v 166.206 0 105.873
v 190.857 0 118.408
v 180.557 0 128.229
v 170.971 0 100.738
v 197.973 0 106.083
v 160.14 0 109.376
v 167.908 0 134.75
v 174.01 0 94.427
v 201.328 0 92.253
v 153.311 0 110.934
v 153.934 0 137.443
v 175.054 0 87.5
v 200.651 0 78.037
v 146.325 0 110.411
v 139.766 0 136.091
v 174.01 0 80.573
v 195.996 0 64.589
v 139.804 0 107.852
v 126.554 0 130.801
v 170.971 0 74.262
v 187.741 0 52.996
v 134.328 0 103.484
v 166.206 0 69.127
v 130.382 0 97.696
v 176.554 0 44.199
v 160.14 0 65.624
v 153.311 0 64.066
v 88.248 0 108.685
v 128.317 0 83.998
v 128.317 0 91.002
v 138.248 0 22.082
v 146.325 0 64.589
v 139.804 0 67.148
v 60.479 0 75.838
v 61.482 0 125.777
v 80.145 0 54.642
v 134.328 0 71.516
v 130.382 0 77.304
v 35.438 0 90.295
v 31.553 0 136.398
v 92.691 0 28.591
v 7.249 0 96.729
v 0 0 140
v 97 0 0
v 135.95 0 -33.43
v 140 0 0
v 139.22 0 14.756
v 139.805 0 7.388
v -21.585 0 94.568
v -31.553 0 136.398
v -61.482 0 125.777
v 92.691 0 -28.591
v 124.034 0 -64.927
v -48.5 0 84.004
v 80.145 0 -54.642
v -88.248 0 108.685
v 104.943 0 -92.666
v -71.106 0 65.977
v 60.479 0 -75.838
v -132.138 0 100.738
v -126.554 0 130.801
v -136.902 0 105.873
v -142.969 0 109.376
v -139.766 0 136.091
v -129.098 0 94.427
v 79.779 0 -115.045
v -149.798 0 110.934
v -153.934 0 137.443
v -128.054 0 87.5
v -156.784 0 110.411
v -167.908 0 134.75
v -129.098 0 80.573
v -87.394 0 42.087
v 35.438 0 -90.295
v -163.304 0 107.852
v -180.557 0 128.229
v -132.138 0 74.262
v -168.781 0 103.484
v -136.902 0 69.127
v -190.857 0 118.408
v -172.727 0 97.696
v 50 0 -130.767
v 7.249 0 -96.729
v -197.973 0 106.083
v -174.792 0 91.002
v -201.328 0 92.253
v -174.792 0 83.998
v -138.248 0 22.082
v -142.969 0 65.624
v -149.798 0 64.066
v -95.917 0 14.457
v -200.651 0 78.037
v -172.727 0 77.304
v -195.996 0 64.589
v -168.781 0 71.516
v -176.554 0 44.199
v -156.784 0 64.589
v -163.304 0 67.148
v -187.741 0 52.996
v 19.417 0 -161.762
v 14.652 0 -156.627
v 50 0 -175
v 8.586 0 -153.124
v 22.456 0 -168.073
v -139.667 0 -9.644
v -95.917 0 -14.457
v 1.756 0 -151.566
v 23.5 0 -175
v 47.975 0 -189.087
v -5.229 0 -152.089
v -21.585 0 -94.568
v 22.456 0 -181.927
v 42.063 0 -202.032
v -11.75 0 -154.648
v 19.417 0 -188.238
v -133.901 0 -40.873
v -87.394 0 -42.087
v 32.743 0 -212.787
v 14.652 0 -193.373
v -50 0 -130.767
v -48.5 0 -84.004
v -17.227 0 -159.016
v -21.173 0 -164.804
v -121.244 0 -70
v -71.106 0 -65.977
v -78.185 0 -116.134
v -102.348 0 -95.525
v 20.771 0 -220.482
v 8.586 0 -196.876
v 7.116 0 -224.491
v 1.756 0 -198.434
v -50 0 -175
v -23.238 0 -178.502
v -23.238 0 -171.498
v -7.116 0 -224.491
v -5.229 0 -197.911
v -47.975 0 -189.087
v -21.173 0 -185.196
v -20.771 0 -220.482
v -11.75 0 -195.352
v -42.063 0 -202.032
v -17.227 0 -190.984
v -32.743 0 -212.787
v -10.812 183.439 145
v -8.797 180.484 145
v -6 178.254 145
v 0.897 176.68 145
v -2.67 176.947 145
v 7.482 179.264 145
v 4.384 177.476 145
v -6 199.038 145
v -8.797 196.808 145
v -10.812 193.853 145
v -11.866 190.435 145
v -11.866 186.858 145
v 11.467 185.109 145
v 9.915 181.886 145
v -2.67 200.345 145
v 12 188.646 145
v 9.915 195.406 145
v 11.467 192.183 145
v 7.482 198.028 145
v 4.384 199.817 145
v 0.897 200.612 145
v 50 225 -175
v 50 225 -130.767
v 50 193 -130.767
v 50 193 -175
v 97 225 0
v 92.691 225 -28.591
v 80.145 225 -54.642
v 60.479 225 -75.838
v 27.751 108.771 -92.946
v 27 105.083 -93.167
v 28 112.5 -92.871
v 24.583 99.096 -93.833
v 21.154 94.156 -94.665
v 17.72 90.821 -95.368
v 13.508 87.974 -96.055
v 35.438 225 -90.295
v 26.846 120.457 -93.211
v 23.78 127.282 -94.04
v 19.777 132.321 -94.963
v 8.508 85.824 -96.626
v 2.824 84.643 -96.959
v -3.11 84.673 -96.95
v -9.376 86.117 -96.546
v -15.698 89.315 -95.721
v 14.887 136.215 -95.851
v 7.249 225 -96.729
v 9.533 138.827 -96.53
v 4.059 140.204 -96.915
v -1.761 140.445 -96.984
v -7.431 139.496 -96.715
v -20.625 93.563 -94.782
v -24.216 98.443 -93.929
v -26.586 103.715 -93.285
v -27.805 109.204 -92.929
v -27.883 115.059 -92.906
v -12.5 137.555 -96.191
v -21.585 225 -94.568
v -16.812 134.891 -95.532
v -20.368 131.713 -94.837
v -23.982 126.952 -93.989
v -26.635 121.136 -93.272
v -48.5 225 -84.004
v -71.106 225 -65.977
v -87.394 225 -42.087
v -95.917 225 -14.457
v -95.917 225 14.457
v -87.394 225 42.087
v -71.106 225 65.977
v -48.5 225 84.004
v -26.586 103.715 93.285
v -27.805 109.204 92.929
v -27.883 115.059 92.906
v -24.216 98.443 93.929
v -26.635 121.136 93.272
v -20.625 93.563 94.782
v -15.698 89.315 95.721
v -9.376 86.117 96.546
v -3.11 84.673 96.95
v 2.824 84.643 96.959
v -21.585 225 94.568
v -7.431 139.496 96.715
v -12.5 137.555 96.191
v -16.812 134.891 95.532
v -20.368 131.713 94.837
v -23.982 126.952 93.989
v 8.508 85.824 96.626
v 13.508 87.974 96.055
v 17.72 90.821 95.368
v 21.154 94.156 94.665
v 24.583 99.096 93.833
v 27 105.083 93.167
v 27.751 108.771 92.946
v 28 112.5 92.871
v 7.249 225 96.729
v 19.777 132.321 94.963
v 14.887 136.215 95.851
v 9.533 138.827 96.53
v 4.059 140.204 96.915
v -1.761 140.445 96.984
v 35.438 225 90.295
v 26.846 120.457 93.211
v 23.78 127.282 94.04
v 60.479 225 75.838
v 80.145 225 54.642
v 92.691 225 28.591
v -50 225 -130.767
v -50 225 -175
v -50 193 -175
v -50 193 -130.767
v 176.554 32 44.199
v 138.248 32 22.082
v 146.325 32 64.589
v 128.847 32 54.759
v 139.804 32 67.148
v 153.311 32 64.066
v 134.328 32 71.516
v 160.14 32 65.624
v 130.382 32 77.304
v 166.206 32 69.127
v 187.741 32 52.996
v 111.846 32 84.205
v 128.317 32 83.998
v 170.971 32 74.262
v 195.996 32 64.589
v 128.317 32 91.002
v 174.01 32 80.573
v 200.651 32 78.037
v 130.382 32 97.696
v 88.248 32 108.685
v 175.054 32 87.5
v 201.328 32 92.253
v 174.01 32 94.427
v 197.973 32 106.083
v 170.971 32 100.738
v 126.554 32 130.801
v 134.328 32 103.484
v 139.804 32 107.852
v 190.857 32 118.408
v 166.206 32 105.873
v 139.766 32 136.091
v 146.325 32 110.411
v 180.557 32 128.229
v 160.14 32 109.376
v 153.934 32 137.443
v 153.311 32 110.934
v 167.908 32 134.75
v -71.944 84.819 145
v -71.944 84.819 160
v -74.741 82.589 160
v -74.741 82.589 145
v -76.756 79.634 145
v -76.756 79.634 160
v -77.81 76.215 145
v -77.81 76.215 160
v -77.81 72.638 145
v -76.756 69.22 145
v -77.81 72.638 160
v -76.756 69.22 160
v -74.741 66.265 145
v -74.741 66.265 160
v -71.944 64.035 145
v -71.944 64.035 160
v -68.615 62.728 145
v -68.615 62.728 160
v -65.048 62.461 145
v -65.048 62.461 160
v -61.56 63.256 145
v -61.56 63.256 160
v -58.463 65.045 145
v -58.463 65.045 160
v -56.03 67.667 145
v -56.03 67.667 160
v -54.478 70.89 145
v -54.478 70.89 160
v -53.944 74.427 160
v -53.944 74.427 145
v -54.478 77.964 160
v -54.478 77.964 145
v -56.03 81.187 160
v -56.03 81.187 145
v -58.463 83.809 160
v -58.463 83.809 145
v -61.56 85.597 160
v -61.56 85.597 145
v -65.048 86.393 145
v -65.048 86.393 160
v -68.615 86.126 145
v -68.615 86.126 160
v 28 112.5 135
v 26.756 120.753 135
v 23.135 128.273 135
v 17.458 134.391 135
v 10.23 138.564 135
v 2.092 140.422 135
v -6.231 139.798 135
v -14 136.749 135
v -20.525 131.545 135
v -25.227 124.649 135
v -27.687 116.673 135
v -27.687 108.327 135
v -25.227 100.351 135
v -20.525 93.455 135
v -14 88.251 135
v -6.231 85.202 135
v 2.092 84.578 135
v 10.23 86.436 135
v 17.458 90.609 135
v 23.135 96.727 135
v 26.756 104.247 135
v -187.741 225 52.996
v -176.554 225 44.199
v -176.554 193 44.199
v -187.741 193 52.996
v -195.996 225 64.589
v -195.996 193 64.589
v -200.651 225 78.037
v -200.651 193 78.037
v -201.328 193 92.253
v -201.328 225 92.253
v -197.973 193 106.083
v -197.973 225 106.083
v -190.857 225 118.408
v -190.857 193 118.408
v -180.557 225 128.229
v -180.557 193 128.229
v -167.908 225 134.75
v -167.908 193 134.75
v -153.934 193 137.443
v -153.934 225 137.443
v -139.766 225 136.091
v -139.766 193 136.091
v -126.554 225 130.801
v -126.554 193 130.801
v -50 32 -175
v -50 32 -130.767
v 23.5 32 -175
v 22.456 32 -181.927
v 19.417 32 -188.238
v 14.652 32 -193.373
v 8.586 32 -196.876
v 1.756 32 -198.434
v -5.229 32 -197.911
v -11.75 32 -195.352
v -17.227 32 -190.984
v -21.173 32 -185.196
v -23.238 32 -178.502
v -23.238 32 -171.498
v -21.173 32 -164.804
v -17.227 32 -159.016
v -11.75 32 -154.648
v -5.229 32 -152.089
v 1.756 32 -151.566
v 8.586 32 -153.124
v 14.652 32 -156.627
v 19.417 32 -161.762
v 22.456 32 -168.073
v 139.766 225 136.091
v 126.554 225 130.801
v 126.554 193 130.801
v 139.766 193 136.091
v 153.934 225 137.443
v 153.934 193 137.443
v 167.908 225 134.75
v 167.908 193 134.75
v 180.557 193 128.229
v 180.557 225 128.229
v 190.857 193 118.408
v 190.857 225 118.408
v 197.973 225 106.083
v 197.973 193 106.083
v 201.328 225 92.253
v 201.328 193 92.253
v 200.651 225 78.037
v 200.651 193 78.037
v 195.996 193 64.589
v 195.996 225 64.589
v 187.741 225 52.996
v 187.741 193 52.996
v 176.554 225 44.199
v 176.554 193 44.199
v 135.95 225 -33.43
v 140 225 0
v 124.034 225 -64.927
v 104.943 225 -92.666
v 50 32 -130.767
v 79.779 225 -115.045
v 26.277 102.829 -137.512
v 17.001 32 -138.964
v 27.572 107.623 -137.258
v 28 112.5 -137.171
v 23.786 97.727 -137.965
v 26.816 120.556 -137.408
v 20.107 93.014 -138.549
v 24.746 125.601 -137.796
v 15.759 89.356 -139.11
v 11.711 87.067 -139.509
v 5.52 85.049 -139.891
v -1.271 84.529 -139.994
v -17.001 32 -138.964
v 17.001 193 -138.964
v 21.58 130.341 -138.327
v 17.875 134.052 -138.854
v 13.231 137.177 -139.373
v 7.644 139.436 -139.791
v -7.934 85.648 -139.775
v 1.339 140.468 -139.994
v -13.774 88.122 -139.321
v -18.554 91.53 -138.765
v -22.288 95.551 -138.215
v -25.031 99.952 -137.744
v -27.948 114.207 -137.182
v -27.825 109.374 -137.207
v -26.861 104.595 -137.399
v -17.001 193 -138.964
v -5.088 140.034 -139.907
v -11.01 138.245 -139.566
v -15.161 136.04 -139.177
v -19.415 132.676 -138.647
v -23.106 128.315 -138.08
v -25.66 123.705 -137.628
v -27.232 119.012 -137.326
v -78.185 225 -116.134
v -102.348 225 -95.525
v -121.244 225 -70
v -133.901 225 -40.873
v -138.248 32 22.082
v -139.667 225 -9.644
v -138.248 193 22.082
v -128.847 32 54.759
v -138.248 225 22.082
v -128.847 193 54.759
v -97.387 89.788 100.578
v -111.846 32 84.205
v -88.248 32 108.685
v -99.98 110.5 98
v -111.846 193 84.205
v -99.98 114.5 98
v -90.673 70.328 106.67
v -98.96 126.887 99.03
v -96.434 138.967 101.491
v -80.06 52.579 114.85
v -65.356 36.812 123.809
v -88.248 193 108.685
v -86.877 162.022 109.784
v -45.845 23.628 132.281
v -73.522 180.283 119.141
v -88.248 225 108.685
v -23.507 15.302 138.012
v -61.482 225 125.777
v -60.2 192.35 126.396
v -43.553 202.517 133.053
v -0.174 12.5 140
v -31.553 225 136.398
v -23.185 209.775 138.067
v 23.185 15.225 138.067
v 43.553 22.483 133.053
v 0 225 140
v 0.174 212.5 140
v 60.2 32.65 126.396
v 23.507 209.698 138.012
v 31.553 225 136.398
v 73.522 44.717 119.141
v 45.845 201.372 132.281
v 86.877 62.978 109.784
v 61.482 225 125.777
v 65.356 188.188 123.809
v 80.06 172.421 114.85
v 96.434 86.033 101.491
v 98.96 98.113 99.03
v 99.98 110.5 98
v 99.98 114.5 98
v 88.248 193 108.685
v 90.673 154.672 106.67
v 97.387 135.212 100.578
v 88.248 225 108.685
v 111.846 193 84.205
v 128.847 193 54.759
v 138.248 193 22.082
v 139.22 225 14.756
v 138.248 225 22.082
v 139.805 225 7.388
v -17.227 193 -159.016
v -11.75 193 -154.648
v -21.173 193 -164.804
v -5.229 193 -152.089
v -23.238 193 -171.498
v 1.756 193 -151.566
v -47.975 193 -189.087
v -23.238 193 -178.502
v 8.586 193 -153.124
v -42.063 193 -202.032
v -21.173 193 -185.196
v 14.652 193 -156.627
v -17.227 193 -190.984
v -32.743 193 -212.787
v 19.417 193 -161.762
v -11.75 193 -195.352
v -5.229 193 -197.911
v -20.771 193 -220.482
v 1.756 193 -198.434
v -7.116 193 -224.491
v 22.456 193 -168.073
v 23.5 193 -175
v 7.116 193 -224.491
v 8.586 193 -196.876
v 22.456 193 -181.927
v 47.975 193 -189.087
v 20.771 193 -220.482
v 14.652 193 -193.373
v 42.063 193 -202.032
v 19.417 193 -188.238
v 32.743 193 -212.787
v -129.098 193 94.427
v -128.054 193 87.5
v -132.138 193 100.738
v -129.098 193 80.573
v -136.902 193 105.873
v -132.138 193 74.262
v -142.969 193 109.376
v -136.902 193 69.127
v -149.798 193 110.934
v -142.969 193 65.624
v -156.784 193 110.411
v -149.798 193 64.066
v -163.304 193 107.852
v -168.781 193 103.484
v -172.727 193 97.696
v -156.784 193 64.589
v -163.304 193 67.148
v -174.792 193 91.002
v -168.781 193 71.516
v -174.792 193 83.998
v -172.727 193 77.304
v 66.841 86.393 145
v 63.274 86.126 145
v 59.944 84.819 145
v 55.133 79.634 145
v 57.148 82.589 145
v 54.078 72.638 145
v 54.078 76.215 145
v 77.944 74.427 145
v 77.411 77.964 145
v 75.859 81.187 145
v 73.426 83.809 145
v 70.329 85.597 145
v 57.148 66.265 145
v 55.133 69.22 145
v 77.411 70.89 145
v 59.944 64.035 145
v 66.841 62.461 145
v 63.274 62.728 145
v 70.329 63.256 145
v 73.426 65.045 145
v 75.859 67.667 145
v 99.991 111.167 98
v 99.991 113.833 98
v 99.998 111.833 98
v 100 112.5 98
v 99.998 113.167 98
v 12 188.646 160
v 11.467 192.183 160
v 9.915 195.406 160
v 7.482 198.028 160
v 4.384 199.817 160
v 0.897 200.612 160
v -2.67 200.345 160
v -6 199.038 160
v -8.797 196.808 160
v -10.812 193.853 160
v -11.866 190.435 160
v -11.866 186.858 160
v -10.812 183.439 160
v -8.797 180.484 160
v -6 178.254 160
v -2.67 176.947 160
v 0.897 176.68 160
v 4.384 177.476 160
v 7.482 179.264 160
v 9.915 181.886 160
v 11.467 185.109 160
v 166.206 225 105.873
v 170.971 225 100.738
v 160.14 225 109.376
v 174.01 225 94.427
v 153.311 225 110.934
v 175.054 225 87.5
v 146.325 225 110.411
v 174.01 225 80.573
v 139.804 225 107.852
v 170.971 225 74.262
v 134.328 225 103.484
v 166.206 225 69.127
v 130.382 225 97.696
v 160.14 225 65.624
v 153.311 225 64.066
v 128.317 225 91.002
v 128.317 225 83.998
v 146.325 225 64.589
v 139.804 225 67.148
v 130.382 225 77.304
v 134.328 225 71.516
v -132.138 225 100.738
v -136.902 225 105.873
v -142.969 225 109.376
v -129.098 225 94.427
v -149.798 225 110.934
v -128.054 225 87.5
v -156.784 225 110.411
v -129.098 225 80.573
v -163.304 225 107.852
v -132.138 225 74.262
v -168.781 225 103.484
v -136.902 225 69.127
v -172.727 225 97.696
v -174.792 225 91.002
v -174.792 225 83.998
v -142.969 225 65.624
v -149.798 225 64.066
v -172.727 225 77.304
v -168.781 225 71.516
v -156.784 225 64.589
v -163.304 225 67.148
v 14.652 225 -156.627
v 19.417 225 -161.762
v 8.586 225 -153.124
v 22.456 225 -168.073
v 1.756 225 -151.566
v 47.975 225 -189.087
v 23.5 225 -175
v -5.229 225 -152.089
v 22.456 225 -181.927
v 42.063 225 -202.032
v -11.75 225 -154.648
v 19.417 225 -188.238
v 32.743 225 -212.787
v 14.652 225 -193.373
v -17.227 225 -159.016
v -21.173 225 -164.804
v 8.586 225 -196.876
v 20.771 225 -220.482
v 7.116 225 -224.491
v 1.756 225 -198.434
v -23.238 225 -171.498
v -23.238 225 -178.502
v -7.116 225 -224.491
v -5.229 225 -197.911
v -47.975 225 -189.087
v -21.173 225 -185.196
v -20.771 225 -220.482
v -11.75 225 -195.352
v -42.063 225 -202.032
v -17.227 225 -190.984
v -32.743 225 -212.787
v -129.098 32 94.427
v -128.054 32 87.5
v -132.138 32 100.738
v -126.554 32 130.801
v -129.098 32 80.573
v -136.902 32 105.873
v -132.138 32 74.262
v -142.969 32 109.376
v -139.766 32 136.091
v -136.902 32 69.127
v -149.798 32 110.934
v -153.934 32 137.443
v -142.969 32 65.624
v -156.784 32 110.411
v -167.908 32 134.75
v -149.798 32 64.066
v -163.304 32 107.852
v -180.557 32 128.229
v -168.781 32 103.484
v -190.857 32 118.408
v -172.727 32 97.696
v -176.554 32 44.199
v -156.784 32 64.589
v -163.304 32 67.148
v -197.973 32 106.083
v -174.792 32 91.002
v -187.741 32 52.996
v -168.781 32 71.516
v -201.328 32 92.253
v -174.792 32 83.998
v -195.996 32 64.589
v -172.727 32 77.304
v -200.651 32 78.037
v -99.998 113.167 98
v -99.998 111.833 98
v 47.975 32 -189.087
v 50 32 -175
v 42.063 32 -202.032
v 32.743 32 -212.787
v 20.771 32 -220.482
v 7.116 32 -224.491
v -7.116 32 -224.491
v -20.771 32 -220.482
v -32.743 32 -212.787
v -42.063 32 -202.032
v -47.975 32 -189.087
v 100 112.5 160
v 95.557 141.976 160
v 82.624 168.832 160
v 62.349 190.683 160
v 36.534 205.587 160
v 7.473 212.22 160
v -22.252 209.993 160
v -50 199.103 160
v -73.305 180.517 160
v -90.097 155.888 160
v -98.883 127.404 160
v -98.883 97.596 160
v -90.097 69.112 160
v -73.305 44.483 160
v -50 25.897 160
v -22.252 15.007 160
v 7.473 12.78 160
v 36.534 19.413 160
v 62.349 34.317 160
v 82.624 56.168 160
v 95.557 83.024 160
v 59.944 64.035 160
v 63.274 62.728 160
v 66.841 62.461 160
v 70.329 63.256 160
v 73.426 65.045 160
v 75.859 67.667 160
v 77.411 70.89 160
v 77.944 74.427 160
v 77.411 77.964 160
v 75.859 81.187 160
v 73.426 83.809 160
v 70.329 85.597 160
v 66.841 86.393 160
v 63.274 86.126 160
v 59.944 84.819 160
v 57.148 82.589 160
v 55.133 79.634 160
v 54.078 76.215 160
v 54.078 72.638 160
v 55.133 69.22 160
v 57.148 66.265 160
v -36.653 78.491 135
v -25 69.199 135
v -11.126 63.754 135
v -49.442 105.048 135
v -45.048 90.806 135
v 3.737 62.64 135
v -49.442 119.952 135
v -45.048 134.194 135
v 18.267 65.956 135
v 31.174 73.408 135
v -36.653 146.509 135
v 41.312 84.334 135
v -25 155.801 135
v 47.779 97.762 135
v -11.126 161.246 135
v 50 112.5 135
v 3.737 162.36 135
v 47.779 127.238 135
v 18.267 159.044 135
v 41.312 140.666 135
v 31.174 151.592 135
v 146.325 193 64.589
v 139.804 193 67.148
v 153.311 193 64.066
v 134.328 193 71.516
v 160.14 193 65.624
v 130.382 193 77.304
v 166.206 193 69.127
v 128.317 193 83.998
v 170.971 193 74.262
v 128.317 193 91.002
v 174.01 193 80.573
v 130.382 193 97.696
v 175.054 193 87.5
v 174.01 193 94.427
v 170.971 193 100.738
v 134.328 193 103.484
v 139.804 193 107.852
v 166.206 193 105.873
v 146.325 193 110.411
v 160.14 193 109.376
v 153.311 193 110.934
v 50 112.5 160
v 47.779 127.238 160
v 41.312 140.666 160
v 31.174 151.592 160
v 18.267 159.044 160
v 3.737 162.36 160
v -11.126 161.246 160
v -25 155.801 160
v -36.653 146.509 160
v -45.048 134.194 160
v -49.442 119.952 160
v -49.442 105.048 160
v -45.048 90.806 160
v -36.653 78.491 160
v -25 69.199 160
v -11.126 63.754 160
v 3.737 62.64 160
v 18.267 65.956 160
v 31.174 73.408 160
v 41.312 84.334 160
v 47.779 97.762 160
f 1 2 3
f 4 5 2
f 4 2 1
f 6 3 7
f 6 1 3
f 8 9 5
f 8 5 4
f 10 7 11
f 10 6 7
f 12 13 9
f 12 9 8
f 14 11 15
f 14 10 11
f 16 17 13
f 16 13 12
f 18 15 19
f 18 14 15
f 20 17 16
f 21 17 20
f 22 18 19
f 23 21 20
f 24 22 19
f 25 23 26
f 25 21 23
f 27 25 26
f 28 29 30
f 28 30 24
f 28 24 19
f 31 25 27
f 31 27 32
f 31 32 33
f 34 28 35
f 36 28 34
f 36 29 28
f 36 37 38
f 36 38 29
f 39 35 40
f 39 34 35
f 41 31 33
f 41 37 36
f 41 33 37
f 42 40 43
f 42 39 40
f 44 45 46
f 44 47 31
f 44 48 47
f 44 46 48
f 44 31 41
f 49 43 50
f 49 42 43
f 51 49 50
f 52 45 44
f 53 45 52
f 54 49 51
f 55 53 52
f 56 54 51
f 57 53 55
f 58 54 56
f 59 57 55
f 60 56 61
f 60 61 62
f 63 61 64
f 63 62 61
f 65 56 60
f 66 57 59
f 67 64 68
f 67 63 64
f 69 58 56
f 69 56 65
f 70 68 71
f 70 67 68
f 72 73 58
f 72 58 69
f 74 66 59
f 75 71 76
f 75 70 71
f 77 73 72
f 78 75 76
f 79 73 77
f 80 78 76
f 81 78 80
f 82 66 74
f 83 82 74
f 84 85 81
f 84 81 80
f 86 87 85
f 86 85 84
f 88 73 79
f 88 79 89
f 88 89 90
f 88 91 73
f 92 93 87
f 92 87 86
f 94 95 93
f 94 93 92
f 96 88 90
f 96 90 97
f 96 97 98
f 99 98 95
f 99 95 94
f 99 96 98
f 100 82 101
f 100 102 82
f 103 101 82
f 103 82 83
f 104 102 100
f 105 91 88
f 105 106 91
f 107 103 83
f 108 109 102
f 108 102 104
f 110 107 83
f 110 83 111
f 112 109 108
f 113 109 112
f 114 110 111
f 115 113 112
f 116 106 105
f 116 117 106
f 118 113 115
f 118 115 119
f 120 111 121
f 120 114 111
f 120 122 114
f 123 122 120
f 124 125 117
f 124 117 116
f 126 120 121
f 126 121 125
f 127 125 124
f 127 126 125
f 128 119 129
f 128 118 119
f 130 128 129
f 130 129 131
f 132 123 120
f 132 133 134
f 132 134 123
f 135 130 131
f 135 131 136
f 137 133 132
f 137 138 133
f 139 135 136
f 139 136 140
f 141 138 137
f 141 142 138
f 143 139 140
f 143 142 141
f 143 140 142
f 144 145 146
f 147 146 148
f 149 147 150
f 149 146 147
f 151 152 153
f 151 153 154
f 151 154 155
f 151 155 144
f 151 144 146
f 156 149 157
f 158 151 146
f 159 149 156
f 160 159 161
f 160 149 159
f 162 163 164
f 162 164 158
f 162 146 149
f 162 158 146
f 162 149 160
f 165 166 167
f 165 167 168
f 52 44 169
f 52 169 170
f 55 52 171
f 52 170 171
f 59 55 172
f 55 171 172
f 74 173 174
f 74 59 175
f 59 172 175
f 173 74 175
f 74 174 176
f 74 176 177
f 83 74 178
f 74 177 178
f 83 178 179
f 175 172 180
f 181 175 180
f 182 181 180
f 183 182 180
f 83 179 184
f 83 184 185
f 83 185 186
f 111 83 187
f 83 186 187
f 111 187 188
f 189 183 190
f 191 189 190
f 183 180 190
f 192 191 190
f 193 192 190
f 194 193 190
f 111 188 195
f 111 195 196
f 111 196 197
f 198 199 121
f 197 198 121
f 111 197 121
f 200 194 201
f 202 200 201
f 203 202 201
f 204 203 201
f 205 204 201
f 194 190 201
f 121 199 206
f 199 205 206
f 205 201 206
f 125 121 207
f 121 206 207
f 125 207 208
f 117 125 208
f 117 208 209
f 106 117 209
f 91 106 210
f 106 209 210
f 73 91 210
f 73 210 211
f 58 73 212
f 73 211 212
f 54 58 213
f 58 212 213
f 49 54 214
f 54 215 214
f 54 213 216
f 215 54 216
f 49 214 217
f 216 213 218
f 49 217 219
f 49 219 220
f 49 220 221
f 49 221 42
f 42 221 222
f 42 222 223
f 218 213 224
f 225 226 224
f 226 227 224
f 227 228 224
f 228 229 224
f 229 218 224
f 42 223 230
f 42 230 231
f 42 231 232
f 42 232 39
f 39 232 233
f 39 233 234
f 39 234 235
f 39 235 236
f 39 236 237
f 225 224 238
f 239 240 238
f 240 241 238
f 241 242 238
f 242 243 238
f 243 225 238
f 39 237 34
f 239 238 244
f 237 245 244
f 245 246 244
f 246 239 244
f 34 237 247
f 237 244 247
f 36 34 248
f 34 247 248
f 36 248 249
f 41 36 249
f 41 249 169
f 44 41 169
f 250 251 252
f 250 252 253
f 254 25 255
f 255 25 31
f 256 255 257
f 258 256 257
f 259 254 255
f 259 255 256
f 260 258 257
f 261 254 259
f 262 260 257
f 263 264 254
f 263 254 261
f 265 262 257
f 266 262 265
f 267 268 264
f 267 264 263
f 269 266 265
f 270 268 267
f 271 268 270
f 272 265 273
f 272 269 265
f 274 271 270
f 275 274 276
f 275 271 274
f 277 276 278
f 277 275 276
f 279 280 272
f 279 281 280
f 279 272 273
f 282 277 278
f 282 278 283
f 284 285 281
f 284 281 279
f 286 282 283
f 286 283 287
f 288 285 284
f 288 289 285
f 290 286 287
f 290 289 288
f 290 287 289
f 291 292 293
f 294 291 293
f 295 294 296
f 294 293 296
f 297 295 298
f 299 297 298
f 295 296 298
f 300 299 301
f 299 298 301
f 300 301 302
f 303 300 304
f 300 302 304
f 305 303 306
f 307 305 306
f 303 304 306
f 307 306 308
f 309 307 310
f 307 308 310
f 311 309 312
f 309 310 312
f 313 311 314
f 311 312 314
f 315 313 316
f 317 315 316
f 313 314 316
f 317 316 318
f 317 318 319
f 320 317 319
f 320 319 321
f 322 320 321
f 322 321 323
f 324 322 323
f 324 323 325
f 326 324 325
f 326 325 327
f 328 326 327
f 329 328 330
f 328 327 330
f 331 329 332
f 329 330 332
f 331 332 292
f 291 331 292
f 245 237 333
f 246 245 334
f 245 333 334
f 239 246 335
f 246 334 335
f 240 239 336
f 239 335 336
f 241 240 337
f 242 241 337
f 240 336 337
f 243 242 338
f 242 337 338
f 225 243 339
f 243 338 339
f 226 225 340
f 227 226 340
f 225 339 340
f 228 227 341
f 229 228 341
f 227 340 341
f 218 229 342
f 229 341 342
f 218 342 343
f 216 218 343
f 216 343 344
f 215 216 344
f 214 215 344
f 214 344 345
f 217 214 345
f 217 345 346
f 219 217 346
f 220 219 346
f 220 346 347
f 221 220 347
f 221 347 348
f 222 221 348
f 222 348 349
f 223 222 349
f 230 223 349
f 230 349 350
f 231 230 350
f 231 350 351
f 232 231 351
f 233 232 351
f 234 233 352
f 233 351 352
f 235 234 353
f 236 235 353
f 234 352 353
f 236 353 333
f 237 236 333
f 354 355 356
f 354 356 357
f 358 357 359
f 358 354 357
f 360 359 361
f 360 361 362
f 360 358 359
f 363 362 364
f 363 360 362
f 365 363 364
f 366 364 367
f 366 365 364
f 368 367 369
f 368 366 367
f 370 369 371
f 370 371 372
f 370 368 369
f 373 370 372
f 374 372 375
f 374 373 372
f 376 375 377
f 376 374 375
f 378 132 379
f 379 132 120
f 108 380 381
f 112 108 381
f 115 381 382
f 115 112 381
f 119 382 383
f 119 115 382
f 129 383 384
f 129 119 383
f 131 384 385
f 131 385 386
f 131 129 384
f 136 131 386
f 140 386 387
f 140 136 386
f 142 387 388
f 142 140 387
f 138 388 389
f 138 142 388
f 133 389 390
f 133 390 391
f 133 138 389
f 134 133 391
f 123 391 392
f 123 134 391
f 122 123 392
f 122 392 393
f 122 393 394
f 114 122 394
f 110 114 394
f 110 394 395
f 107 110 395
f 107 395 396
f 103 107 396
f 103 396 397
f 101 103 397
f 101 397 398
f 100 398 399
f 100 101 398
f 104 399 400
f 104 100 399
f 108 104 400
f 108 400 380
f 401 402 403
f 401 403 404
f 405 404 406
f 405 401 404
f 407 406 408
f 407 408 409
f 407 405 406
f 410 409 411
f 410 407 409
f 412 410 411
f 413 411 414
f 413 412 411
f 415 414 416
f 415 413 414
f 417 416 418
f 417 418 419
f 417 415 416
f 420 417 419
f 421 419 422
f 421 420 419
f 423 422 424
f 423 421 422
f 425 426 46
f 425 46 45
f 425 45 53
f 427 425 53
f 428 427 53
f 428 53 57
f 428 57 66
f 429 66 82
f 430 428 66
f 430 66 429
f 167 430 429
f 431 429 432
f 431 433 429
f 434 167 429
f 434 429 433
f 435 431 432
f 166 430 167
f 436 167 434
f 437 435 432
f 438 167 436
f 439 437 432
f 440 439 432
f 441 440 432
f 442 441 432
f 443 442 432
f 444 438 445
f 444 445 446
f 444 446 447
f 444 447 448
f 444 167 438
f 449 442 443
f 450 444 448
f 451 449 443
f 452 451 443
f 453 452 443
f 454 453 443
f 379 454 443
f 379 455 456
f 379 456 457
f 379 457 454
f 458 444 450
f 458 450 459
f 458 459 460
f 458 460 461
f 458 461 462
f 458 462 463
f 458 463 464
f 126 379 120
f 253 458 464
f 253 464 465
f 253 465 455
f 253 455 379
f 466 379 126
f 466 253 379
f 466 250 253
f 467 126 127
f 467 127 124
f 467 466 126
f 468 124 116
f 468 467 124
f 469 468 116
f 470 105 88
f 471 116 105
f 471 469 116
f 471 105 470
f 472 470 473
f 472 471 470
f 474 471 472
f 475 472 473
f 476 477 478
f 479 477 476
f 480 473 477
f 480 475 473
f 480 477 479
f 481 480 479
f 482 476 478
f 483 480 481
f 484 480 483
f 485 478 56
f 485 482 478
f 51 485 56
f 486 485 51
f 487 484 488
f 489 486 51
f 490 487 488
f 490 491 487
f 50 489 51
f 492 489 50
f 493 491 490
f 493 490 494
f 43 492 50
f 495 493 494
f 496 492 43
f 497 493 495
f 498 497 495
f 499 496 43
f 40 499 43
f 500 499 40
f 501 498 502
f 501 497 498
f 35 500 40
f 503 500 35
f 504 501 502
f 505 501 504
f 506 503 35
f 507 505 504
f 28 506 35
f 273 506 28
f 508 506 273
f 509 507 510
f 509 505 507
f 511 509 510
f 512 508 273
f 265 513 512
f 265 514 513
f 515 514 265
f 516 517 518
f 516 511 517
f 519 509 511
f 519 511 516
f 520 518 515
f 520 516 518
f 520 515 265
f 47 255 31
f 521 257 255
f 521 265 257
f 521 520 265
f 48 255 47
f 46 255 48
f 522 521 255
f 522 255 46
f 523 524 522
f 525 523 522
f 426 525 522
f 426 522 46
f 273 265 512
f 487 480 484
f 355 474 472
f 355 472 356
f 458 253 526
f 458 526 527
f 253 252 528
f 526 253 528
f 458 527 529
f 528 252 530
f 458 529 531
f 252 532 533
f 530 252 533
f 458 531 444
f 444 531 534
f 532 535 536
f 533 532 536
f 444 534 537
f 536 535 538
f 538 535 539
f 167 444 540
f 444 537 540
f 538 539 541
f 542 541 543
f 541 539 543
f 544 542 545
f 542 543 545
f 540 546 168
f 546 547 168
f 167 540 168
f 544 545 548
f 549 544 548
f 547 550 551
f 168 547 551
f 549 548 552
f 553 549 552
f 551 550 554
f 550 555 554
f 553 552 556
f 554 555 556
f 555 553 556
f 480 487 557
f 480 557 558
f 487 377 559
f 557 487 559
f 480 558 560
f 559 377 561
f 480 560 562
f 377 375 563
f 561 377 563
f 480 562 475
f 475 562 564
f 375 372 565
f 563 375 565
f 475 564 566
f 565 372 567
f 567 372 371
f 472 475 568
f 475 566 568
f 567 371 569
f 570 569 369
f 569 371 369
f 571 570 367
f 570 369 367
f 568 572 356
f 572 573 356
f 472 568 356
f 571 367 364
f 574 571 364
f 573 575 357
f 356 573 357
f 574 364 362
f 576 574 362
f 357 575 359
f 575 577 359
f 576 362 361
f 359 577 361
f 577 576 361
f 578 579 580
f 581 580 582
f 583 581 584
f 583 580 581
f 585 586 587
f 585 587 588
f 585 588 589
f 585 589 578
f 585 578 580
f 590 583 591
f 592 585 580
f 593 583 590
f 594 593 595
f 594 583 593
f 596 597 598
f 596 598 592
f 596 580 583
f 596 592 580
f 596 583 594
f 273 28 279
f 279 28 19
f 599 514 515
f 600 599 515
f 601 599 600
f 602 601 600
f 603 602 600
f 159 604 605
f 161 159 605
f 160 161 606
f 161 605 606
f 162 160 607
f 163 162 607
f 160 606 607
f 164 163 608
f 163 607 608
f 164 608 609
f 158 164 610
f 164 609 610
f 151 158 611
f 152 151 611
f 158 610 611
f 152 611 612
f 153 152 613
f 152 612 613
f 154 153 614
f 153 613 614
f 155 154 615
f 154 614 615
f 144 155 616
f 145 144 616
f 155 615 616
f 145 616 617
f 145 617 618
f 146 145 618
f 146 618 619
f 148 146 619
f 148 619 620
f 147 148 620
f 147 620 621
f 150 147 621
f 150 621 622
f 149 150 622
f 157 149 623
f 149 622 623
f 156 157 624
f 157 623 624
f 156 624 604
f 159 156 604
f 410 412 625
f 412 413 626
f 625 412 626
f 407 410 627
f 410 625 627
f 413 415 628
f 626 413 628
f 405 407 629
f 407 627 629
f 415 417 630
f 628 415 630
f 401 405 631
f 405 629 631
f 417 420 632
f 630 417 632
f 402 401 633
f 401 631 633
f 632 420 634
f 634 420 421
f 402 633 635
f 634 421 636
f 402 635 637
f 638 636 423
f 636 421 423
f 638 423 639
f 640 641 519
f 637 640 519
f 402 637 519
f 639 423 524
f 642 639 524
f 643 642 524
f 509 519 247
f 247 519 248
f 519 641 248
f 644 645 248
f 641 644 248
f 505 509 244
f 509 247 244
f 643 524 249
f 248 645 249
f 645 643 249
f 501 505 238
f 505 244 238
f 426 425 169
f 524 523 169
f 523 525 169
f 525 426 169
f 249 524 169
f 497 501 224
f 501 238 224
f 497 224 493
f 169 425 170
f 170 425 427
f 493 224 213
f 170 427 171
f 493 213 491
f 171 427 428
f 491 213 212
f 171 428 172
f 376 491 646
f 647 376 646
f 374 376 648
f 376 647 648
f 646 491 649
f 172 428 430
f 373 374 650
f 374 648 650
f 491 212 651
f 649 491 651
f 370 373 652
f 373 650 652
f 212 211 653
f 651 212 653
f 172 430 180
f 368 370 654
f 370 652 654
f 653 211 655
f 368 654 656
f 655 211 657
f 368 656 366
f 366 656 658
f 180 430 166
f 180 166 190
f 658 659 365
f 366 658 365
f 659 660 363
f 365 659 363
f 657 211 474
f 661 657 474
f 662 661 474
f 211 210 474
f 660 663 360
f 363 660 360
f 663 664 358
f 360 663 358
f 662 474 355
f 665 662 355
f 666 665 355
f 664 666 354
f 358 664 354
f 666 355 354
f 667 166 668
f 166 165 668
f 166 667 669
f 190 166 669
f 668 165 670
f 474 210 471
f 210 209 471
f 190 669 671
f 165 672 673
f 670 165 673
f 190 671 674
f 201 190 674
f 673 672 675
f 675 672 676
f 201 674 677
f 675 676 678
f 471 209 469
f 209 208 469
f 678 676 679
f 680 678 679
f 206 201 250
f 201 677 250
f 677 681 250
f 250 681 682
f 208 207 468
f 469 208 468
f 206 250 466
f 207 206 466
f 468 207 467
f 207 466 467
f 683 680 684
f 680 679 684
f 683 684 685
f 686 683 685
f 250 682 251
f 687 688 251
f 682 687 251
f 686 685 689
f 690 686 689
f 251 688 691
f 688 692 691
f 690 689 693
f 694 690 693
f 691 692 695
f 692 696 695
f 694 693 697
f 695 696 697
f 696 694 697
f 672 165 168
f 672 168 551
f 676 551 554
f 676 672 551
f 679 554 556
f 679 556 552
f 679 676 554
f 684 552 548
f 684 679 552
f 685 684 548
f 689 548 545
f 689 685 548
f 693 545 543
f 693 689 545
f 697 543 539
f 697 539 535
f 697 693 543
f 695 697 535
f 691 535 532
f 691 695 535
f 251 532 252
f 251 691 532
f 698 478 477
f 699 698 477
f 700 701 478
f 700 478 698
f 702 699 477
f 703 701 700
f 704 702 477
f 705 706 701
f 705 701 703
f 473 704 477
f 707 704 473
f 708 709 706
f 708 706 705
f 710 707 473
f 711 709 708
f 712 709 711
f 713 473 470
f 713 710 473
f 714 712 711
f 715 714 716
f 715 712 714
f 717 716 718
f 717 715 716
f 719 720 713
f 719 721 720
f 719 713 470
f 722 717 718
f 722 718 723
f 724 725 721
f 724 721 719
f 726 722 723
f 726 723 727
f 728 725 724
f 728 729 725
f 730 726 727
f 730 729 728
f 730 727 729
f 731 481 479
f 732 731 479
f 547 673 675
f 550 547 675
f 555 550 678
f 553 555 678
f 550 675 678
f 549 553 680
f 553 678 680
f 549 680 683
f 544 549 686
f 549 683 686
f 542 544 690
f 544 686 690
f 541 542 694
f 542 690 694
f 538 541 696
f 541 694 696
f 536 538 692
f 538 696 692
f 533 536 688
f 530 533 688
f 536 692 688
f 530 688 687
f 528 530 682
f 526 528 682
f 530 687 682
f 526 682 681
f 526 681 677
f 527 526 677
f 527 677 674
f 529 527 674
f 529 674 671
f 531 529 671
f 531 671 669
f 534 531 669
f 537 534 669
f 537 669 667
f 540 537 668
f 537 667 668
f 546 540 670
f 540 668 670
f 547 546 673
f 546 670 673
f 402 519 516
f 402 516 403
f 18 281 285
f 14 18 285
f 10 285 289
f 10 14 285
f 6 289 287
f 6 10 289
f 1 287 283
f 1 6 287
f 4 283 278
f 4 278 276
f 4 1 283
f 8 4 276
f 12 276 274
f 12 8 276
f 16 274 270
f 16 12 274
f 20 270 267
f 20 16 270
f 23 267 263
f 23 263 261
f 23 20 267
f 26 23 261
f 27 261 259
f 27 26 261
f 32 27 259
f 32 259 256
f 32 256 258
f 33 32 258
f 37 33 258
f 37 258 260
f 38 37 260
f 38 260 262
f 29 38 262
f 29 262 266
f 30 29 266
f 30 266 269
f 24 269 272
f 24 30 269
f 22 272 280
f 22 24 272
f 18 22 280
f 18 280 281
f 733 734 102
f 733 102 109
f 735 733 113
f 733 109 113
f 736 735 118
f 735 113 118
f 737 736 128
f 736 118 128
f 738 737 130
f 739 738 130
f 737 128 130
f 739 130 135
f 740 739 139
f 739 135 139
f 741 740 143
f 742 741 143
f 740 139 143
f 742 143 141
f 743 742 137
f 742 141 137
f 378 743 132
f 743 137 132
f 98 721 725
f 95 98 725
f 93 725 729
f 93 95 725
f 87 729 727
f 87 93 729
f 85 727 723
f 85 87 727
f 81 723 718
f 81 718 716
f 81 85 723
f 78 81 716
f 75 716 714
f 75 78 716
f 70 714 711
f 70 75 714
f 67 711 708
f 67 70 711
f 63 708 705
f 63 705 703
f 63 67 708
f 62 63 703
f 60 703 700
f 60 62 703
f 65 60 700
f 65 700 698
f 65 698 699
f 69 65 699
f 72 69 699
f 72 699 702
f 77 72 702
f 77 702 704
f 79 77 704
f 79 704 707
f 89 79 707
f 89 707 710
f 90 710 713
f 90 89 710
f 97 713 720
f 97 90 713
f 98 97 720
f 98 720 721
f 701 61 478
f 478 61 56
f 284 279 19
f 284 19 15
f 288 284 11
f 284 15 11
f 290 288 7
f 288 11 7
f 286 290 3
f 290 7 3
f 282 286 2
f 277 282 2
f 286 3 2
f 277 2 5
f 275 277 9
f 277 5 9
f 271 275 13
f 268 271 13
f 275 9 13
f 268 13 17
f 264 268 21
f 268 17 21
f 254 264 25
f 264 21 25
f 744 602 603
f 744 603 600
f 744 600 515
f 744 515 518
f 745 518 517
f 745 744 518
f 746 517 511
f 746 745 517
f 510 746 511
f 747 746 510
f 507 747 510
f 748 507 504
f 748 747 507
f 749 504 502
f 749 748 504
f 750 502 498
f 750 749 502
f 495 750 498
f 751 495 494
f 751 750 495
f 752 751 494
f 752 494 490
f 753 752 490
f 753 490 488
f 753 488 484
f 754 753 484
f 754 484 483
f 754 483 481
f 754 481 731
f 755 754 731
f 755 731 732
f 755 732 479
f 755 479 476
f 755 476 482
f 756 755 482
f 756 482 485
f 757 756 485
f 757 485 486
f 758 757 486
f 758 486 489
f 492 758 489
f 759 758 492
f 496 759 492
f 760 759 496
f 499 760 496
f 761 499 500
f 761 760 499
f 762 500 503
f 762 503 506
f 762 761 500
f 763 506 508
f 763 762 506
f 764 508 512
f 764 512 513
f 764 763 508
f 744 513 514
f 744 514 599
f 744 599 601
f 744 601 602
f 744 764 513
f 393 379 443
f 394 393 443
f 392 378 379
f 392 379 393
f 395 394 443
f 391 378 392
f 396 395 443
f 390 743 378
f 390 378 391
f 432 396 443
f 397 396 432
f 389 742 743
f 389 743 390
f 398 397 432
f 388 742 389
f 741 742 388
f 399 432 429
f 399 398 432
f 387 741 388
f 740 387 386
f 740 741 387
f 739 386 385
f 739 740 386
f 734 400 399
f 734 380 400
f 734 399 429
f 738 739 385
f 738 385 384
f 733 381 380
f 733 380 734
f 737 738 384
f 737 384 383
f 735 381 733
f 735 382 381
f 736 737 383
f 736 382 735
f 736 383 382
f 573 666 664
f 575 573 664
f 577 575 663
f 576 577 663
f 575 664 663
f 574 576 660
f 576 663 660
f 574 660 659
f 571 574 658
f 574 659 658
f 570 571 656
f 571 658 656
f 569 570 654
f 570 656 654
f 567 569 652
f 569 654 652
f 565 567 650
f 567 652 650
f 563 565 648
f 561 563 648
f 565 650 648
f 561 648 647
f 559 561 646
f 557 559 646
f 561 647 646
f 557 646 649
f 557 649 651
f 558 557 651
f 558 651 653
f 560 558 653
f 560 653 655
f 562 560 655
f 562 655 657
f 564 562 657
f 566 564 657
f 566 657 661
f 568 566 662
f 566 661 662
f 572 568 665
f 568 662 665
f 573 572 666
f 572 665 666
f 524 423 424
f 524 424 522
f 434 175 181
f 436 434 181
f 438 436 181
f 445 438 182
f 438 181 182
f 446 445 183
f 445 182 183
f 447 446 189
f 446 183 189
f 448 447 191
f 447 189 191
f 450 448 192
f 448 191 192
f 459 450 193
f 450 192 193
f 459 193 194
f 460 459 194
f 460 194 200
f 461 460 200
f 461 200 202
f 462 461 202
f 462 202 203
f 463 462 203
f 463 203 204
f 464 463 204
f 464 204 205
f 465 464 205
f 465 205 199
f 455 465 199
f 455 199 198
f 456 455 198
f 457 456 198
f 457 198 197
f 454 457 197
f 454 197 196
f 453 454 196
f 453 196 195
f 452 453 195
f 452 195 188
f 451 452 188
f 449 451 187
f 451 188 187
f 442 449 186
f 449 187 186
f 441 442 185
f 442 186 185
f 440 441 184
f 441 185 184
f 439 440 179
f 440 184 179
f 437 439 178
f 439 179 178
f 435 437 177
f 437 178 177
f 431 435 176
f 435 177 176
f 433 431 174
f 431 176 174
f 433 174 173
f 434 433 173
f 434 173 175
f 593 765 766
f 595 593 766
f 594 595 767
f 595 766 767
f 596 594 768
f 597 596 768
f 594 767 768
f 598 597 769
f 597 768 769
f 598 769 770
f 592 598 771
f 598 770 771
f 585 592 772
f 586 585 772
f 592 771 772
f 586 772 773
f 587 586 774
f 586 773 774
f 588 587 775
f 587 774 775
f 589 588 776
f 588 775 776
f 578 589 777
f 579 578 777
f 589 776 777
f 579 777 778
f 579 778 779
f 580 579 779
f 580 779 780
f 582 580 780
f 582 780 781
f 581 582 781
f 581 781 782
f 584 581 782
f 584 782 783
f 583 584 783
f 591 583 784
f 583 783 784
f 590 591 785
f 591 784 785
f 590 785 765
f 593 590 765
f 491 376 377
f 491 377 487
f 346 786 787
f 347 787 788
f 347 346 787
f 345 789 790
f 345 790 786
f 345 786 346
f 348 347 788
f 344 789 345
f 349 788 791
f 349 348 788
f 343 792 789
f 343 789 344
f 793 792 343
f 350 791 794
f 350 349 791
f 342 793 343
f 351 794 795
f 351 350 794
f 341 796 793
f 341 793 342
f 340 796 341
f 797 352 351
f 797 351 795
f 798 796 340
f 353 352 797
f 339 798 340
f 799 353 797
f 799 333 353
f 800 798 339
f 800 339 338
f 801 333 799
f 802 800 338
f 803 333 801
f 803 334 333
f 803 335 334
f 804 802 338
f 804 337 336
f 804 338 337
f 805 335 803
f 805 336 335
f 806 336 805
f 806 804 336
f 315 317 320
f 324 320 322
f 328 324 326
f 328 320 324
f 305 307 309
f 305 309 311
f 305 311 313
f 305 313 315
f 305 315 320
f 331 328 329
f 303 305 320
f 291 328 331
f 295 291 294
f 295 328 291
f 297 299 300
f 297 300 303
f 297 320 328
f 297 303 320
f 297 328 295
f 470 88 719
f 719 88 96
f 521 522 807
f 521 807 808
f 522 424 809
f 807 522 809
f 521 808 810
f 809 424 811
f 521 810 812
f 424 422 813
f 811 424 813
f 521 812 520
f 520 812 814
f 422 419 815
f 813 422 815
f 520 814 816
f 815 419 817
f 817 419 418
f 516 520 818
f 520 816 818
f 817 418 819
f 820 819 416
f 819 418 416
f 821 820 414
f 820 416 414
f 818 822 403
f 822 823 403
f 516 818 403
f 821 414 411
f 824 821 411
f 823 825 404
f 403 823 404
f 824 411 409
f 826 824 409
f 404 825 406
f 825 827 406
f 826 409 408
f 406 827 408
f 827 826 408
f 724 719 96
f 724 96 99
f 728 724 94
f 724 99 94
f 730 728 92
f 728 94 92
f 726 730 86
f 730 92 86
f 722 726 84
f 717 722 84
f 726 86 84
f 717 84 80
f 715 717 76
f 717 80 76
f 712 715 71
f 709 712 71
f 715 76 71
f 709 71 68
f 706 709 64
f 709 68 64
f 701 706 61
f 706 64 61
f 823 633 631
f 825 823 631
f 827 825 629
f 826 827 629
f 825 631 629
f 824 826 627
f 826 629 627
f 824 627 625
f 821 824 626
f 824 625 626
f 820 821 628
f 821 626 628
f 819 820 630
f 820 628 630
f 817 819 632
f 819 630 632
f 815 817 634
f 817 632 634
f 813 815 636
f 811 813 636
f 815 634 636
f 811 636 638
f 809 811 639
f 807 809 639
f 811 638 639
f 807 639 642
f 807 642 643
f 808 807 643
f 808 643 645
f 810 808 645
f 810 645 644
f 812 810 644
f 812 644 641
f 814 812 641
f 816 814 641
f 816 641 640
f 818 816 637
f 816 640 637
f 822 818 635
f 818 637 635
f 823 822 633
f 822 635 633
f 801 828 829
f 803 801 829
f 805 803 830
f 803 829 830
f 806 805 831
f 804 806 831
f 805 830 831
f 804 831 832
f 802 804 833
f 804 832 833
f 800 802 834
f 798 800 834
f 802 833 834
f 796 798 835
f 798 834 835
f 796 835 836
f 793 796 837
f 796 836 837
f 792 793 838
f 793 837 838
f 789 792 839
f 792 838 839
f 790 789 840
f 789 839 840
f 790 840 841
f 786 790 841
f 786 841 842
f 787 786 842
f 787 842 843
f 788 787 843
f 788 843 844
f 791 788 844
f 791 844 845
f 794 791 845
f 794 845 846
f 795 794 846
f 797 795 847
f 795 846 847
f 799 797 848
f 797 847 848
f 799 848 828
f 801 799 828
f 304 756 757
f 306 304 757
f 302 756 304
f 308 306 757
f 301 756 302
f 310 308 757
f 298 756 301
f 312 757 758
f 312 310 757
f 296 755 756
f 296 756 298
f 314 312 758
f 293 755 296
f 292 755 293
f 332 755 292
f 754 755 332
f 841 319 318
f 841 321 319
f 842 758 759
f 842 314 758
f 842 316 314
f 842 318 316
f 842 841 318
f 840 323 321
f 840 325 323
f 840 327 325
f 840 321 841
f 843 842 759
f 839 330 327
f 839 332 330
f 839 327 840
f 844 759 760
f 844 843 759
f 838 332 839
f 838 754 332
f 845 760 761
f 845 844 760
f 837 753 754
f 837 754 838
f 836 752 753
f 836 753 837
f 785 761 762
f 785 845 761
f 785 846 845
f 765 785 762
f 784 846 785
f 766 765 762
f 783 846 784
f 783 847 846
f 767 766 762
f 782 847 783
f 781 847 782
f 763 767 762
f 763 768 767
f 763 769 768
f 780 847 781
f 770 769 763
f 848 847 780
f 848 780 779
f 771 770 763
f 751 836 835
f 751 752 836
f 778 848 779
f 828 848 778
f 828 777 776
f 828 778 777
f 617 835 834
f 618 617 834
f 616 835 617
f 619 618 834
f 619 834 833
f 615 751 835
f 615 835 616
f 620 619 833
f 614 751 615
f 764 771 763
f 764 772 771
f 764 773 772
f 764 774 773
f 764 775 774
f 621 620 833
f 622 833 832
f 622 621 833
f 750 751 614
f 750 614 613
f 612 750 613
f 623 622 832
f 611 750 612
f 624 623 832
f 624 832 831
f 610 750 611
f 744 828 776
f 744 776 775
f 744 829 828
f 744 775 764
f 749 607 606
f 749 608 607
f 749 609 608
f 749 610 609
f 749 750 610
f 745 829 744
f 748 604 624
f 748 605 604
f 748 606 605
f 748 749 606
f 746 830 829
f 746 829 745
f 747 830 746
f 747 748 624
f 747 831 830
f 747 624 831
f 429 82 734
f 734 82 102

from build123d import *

# Parameters (mm, degrees)
SKETCH1_W           = 43
SKETCH1_H           = 225
SKETCH2_R           = 23.5
BOSS_EXTRUDE1_DEPTH = 32
CIRPATTERN1_COUNT   = 3
SKETCH3_R           = 23.5
BOSS_EXTRUDE2_DEPTH = 32
CIRPATTERN2_COUNT   = 3
BOSS_EXTRUDE4_START = 20
SKETCH5_R           = 100
BOSS_EXTRUDE4_DEPTH = 62
SKETCH6_R           = 50
CUT_EXTRUDE2_DEPTH  = 25
SKETCH4_R           = 28
CUT_EXTRUDE1_DEPTH  = 342
SKETCH7_R           = 12
CUT_EXTRUDE3_DEPTH  = 15
CIRPATTERN3_COUNT   = 3


with BuildPart() as part:
    # Sketch1 → Revolve1 (revolve)
    with BuildSketch(Plane.XY):
        with Locations((118.5, 112.5)):
            Rectangle(SKETCH1_W, SKETCH1_H)
    revolve(axis=Axis((0, 0, 0), (0, 1, 0)))

    # Sketch2 → Boss-Extrude1 (add)
    with BuildSketch(Plane(origin=(0, 225, 0), x_dir=(1, 0, 0), z_dir=(0, 1, 0))):
        with BuildLine():
            ThreePointArc((50, 175), (0, 225), (-50, 175))
            Line((-50, 175), (-50, 130.766968306))
            ThreePointArc((-50, 130.766968306), (0, 140), (50, 130.766968306))
            Line((50, 130.766968306), (50, 175))
        make_face()
        with Locations((0, 175)):
            Circle(SKETCH2_R, mode=Mode.SUBTRACT)
    boss_extrude1 = extrude(amount=-BOSS_EXTRUDE1_DEPTH)

    # CirPattern1: Boss-Extrude1 ×3 about axis
    cirpattern1_axis = Axis((0, 0, 0), (0, 1, 0))
    for i in range(1, CIRPATTERN1_COUNT):
        add(boss_extrude1.rotate(cirpattern1_axis, i * 360 / CIRPATTERN1_COUNT))

    # Sketch3 → Boss-Extrude2 (add)
    with BuildSketch(Plane(origin=(0, 0, 0), x_dir=(1, 0, 0), z_dir=(0, 1, 0))):
        with BuildLine():
            ThreePointArc((50, 175), (0, 225), (-50, 175))
            Line((-50, 175), (-50, 130.766968306))
            ThreePointArc((-50, 130.766968306), (0, 140), (50, 130.766968306))
            Line((50, 130.766968306), (50, 175))
        make_face()
        with Locations((0, 175)):
            Circle(SKETCH3_R, mode=Mode.SUBTRACT)
    boss_extrude2 = extrude(amount=BOSS_EXTRUDE2_DEPTH)

    # CirPattern2: Boss-Extrude2 ×3 about axis
    cirpattern2_axis = Axis((0, 0, 0), (0, 1, 0))
    for i in range(1, CIRPATTERN2_COUNT):
        add(boss_extrude2.rotate(cirpattern2_axis, i * 360 / CIRPATTERN2_COUNT))

    # Sketch5 → Boss-Extrude4 (add)
    with BuildSketch(Plane.XY.offset(140).offset(BOSS_EXTRUDE4_START)):
        with Locations((0, 112.5)):
            Circle(SKETCH5_R)
    extrude(amount=-BOSS_EXTRUDE4_DEPTH)

    # Sketch6 → Cut-Extrude2 (cut)
    with BuildSketch(Plane.XY.offset(160)):
        with Locations((0, 112.5)):
            Circle(SKETCH6_R)
    extrude(amount=-CUT_EXTRUDE2_DEPTH, mode=Mode.SUBTRACT)

    # Sketch4 → Cut-Extrude1 (cut)
    with BuildSketch(Plane.XY.offset(140)):
        with Locations((0, 112.5)):
            Circle(SKETCH4_R)
    extrude(amount=-CUT_EXTRUDE1_DEPTH, mode=Mode.SUBTRACT)

    # Sketch7 → Cut-Extrude3 (cut)
    with BuildSketch(Plane.XY.offset(160)):
        with Locations((0, 188.646045953)):
            Circle(SKETCH7_R)
    cut_extrude3 = extrude(amount=-CUT_EXTRUDE3_DEPTH, mode=Mode.SUBTRACT)

    # CirPattern3: Cut-Extrude3 ×3 about axis
    cirpattern3_axis = Axis((0, 112.5, 0), (0, 0, 1))
    for i in range(1, CIRPATTERN3_COUNT):
        add(cut_extrude3.rotate(cirpattern3_axis, i * 360 / CIRPATTERN3_COUNT), mode=Mode.SUBTRACT)


solid = part.part
